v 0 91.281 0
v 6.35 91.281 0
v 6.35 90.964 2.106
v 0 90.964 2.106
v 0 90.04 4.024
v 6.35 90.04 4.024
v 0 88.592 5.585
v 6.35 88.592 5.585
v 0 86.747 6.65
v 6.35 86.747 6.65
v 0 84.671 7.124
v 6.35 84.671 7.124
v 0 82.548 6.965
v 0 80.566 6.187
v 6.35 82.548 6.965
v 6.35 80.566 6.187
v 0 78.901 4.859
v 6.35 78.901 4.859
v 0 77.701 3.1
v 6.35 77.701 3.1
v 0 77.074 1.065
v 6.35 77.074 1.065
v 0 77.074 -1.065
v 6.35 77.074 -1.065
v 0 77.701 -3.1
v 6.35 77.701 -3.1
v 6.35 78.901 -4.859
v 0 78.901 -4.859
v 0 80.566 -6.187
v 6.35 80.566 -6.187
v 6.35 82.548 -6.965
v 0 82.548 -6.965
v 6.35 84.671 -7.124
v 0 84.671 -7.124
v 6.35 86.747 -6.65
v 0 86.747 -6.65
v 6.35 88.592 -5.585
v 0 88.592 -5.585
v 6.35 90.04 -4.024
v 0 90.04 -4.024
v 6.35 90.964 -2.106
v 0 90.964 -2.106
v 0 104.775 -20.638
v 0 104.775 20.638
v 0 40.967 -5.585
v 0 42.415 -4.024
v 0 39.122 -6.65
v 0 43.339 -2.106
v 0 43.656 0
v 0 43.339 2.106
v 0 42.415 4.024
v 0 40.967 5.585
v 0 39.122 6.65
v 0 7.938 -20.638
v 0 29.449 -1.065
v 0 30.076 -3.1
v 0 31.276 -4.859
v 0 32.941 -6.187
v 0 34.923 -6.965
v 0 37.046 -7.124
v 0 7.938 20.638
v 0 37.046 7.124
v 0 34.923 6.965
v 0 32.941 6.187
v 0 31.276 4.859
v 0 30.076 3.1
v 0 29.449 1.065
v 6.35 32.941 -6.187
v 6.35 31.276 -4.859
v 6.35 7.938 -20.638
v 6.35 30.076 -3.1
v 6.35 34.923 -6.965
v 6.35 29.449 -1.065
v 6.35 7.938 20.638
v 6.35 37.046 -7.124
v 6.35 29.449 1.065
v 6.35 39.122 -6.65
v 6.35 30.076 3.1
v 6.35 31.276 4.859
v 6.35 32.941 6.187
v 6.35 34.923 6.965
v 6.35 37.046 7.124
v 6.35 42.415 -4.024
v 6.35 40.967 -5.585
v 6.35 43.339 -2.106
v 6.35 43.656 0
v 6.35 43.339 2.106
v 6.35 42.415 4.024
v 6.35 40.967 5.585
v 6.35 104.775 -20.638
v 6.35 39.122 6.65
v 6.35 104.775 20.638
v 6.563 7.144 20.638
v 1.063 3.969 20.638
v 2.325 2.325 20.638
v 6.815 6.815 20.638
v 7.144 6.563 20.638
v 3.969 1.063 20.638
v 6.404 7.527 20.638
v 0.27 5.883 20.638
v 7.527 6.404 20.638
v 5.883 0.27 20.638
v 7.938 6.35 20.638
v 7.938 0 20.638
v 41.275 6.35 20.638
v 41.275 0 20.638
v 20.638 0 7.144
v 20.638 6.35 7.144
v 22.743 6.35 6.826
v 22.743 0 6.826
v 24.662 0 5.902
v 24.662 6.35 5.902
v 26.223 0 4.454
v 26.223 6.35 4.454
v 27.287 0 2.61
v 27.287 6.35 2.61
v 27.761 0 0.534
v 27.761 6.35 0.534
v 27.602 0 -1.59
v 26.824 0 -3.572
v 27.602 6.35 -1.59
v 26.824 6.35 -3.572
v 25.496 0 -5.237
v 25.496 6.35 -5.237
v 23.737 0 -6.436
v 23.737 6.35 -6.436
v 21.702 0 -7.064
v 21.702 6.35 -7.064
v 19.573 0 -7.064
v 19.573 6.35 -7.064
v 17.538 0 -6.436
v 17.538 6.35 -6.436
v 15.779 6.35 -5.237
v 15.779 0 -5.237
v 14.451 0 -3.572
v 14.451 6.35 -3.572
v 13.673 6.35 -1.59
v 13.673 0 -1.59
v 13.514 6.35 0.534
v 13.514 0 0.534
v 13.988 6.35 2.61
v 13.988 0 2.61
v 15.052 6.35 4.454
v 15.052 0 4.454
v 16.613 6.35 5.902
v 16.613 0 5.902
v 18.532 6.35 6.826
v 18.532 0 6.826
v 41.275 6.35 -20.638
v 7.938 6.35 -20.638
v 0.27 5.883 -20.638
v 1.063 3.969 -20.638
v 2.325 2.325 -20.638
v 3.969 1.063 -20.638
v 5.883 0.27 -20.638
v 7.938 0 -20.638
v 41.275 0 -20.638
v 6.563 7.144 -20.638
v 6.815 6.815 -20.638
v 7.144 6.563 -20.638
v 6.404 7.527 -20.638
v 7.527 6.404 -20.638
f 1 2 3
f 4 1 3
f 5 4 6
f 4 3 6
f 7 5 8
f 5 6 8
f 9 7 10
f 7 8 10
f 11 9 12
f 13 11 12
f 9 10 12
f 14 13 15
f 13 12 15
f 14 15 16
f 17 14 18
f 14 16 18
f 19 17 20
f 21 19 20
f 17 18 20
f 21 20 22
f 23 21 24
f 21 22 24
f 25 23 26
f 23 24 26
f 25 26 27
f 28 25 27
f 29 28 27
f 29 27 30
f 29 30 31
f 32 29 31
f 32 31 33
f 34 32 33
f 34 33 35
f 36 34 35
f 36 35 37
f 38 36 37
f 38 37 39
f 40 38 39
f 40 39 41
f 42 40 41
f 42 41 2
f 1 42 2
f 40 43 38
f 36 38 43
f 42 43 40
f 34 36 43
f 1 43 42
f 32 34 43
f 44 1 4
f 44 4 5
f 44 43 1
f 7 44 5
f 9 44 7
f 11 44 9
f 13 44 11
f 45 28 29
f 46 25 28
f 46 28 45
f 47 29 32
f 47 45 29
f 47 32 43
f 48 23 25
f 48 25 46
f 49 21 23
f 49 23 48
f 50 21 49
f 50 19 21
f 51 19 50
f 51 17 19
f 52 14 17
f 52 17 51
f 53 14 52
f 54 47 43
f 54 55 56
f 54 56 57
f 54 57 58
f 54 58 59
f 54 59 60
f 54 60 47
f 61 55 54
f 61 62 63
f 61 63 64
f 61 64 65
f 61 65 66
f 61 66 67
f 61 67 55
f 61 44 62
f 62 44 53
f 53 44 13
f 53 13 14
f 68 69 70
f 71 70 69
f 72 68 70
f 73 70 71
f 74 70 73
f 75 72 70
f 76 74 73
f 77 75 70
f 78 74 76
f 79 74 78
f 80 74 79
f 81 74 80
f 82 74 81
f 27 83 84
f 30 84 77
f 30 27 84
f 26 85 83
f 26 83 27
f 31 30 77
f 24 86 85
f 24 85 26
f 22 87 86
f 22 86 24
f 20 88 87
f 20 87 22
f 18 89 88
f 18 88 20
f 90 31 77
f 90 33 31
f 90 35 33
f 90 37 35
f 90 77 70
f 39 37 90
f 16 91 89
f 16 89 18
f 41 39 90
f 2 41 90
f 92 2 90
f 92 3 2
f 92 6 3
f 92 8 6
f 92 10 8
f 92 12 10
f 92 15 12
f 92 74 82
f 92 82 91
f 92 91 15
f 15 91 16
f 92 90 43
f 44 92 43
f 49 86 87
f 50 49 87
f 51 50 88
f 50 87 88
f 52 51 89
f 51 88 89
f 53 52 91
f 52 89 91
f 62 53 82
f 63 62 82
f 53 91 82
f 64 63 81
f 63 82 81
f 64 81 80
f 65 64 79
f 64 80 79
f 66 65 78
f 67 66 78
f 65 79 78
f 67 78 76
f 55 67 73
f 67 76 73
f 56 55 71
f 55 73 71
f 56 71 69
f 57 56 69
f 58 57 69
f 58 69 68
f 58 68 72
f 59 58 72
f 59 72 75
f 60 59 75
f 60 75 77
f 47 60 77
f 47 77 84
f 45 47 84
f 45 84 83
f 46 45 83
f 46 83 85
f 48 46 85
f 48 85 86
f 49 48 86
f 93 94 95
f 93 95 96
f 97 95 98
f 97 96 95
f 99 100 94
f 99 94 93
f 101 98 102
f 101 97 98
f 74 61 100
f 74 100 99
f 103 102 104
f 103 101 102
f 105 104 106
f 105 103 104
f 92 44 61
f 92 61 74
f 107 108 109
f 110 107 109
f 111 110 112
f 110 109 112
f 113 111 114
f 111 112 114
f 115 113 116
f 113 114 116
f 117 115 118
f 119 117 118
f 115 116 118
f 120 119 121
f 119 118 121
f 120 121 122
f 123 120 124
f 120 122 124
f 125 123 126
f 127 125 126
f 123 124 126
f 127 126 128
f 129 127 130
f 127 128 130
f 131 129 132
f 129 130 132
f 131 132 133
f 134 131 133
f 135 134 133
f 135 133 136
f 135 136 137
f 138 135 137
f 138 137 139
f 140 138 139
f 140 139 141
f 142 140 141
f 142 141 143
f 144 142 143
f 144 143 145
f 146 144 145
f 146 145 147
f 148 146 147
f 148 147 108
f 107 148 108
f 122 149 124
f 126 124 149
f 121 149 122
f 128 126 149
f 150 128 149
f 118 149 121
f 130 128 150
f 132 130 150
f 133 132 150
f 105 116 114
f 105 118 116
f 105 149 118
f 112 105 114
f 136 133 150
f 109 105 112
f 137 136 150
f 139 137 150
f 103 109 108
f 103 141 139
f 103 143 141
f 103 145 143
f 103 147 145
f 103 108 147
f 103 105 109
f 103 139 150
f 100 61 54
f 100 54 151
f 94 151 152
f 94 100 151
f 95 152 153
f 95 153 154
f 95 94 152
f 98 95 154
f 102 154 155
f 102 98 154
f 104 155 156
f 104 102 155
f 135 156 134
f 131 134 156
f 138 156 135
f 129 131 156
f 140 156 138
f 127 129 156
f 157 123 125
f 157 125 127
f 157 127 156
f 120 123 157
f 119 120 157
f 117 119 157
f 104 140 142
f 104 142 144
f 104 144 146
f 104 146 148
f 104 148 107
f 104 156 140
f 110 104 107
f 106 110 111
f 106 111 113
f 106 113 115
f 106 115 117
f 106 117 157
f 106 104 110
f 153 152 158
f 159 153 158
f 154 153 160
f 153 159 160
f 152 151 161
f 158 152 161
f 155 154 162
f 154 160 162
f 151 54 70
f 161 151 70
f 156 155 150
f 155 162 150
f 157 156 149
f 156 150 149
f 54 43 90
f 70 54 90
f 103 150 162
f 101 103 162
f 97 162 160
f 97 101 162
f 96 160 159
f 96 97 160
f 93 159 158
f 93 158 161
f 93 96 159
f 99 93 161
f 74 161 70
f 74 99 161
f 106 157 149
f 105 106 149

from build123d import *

# Parameters (mm, degrees)
EXTRUDE_THIN1_DEPTH = 20.6375
SKETCH2_R           = 7.14375
CUT_EXTRUDE1_DEPTH  = 109.706083805
SKETCH3_R           = 7.14375
CUT_EXTRUDE2_DEPTH  = 113.354183973


with BuildPart() as part:
    # Sketch1 → Extrude-Thin1 (new, symmetric)
    with BuildSketch(Plane.XY):
        with BuildLine():
            Line((0, 104.775), (0, 7.9375))
            ThreePointArc((0, 7.9375), (2.324839924, 2.324839924), (7.9375, 0))
            Line((7.9375, 0), (41.275, 0))
            Line((41.275, 0), (41.275, 6.35))
            Line((41.275, 6.35), (7.9375, 6.35))
            ThreePointArc((7.9375, 6.35), (6.814967985, 6.814967985), (6.35, 7.9375))
            Line((6.35, 7.9375), (6.35, 104.775))
            Line((6.35, 104.775), (0, 104.775))
        make_face()
    extrude(amount=EXTRUDE_THIN1_DEPTH, both=True)

    # Sketch2 → Cut-Extrude1 (cut, through all)
    with BuildSketch(Plane(origin=(0, 6.35, 0), x_dir=(1, 0, 0), z_dir=(0, 1, 0))):
        with Locations(Location((20.6375, 0, 0), (0, 0, 270))):
            Circle(SKETCH2_R)
    extrude(amount=-CUT_EXTRUDE1_DEPTH, mode=Mode.SUBTRACT)

    # Sketch3 → Cut-Extrude2 (cut, through all)
    with BuildSketch(Plane(origin=(6.35, 0, 0), x_dir=(0, 0, -1), z_dir=(1, 0, 0))):
        with Locations(Location((0, 84.1375, 0), (0, 0, 90))):
            Circle(SKETCH3_R)
        with Locations(Location((0, 36.5125, 0), (0, 0, 90))):
            Circle(SKETCH3_R)
    extrude(amount=-CUT_EXTRUDE2_DEPTH, mode=Mode.SUBTRACT)


solid = part.part
